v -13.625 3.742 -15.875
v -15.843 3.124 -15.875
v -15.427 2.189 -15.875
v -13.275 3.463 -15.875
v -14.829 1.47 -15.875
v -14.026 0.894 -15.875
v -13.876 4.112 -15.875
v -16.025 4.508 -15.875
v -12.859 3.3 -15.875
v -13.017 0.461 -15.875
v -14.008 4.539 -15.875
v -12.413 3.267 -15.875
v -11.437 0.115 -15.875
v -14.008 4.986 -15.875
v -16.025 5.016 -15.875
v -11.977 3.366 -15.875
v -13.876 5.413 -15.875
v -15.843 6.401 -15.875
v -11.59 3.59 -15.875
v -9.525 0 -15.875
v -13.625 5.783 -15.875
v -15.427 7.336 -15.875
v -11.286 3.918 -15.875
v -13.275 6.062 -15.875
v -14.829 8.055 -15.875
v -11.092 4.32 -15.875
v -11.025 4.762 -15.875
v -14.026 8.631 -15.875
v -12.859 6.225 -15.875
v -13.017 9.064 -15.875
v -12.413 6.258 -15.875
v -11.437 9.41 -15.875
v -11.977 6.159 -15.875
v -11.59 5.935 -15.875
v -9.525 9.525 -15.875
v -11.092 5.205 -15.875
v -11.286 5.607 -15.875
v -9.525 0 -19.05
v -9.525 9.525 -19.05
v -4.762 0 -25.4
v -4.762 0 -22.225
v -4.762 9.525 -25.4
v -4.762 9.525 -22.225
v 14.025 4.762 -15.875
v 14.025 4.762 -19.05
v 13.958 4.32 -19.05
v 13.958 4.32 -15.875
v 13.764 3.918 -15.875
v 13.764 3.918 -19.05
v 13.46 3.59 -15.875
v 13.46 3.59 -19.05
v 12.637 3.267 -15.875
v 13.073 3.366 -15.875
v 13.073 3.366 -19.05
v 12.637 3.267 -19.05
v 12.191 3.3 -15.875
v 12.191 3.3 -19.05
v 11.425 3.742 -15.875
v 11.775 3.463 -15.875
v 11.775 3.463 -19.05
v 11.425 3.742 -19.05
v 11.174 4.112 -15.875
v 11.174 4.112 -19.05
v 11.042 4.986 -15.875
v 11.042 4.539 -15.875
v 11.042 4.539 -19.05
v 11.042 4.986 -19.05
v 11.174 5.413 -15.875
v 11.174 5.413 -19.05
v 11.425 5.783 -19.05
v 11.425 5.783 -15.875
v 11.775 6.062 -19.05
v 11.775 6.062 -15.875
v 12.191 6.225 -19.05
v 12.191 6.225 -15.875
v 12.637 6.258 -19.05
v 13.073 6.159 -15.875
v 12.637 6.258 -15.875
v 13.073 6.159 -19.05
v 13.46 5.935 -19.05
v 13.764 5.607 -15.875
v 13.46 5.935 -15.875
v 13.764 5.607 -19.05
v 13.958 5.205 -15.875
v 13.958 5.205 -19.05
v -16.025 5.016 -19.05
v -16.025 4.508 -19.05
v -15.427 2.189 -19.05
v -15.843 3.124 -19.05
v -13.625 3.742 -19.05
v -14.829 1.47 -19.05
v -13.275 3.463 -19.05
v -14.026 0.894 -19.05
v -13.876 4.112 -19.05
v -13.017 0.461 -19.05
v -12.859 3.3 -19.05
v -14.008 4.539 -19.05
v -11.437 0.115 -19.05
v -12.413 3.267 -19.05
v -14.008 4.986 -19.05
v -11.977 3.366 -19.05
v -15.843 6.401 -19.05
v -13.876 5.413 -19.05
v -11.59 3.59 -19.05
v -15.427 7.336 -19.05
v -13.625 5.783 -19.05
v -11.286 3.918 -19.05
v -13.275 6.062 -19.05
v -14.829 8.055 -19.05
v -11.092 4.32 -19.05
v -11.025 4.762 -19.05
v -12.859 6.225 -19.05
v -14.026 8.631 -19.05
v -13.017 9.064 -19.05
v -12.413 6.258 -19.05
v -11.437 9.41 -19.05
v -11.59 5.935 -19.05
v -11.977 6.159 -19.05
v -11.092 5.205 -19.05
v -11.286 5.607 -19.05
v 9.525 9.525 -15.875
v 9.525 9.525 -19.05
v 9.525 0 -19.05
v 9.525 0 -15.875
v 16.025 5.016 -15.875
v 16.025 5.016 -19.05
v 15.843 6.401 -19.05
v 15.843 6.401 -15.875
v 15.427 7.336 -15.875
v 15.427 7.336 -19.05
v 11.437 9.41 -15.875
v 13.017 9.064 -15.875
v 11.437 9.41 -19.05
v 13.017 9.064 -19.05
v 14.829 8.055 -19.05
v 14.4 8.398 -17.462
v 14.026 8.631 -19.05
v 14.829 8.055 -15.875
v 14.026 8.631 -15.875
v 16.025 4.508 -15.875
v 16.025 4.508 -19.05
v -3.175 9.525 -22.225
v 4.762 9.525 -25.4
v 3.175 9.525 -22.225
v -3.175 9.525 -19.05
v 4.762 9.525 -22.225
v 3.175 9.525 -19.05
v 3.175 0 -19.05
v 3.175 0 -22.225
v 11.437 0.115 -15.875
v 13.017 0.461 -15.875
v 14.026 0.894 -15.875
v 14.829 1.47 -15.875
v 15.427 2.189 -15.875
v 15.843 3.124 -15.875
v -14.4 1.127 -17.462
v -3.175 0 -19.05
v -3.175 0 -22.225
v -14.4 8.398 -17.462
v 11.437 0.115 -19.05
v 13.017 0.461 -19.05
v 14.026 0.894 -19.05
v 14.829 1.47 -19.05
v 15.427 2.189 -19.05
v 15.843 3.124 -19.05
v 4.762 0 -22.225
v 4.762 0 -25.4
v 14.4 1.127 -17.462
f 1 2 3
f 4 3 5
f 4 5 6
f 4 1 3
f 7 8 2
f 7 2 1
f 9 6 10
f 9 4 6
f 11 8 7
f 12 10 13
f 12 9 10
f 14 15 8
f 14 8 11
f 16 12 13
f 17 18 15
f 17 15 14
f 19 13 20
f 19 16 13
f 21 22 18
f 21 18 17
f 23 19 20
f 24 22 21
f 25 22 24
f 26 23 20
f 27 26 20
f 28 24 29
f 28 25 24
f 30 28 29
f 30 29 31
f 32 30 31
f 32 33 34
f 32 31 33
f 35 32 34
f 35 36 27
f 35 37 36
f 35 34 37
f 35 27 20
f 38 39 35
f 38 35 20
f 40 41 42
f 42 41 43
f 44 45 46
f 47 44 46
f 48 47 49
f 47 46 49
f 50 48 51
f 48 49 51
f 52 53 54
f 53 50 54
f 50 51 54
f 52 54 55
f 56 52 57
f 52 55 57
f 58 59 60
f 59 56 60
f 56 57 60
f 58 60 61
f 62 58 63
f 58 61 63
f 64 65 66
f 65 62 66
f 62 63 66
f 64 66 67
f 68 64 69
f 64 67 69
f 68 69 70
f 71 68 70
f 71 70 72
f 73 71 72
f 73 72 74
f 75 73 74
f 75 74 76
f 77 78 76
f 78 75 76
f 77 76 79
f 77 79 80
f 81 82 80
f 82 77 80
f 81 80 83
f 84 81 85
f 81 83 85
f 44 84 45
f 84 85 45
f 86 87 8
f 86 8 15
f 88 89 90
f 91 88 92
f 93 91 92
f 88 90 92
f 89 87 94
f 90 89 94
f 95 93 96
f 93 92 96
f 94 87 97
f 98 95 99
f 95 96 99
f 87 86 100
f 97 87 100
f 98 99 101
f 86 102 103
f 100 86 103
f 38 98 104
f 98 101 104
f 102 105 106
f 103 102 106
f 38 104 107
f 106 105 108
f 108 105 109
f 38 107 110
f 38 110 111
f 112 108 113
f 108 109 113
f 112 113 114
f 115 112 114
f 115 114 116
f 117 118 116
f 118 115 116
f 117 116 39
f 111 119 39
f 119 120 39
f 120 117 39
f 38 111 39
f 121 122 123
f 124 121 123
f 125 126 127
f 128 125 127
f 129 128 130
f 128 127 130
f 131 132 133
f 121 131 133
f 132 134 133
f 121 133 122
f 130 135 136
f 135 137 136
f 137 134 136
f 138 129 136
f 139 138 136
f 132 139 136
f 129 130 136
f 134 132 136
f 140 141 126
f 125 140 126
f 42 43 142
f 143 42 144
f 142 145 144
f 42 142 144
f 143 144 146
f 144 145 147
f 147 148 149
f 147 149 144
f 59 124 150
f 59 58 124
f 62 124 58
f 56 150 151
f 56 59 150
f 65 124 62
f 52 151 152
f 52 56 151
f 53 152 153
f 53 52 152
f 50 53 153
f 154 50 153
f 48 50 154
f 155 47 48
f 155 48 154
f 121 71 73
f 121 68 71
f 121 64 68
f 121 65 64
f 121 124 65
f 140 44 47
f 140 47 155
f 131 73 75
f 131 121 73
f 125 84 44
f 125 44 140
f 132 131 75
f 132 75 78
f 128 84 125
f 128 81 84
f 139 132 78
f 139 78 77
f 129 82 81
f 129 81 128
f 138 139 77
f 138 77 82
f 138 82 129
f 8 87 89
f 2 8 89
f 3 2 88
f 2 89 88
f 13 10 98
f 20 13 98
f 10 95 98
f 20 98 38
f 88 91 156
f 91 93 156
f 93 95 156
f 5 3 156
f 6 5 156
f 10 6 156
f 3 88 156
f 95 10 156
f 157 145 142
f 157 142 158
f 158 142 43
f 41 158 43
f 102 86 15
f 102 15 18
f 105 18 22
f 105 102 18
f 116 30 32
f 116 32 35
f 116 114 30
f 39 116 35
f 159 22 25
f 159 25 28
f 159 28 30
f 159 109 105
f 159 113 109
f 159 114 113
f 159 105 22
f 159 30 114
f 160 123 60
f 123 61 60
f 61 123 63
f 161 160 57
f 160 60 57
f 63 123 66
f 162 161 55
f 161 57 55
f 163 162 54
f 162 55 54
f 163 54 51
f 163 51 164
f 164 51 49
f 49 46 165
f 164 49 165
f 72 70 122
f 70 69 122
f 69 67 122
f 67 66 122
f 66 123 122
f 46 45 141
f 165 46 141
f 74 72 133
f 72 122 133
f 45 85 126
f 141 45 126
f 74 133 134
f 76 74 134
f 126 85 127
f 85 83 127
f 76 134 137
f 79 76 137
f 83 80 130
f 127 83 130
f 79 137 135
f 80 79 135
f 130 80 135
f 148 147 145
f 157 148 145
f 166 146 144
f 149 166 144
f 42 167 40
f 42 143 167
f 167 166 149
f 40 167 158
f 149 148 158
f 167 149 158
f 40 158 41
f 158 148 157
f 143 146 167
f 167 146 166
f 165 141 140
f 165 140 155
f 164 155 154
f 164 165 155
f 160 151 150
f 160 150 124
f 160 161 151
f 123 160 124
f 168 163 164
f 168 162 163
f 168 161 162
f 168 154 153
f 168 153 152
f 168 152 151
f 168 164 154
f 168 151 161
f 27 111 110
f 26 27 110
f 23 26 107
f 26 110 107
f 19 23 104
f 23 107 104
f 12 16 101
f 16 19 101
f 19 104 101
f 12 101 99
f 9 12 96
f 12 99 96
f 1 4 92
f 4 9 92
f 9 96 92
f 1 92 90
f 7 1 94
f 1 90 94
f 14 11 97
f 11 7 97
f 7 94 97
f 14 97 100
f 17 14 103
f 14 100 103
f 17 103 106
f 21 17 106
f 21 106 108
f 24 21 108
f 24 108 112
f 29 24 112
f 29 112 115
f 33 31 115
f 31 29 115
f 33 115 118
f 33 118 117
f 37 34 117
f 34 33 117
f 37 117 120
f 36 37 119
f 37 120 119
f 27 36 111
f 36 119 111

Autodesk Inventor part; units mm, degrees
ref_plane "Work Plane7" through (0, 3.175, 0) normal (0, 1, 0) x (1, 0, 0)
ref_plane "Work Plane8" through (9.525, 0, -19.05) normal (0, 0, -1) x (-1, 0, 0)
sketch "Sketch4" plane through (9.525, 0, -19.05) normal (0, 0, -1) x (-1, 0, 0)
  line L0 (12.7, 0) -> (6.35, 0)
  line L1 (6.35, 0) -> (6.35, 9.525)
  line L2 (6.35, 9.525) -> (12.7, 9.525)
  line L3 (12.7, 9.525) -> (12.7, 0)
  line L4 (12.7, 0) -> (6.35, 9.525) construction
  line L5 (6.35, 0) -> (12.7, 9.525) construction
  point P0 (9.525, 0)
  point P1 (9.525, 4.7625)
extrude "Extrusion4" add sketch "Sketch4" along normal blind 3.175
sketch "Sketch5" plane through (9.525, 0, -22.225) normal (0, 0, -1) x (-1, 0, 0)
  line L0 (4.7625, 0) -> (14.2875, 0)
  line L1 (14.2875, 0) -> (14.2875, 9.525)
  line L2 (14.2875, 9.525) -> (4.7625, 9.525)
  line L3 (4.7625, 9.525) -> (4.7625, 0)
  line L4 (4.7625, 0) -> (14.2875, 9.525) construction
  line L5 (14.2875, 0) -> (4.7625, 9.525) construction
  point P0 (9.525, 0)
  point P1 (9.525, 4.7625)
extrude "Extrusion5" add sketch "Sketch5" along normal blind 3.175
ref_plane "Work Plane6" through (3.175, 9.525, 25.4) normal (0, 0, 1) x (1, 0, 0)
ref_plane "Work Plane5" through (-4.7625, 0, 3.175) normal (0, 0, 1) x (1, 0, 0)
sketch "Sketch8" plane through (9.525, 0, -19.05) normal (0, 0, 1) x (1, 0, 0)
  circle A0 centre (3, 4.7625) radius 1.5
  line L0 (6.5, 4.5085) -> (6.5, 5.0165)
  line L1 (6.5, 5.0165) -> (6.5, 9.525) construction
  line L2 (6.5, 9.525) -> (0, 9.525) construction
  spline S0 degree 2 poles (6.5, 5.0165) (6.5, 9.525) (0, 9.525) knots 1 1 1 2 2 2
  line L3 (6.5, 4.5085) -> (6.5, 0) construction
  line L4 (6.5, 0) -> (0, 0) construction
  spline S1 degree 2 poles (6.5, 4.5085) (6.5, 0) (0, 0) knots 1 1 1 2 2 2
  line L5 (-9.525, 0) -> (-9.525, 9.525)
  line L6 (-14.2875, 9.525) -> (-4.7625, 9.525)
  line L7 (0, 9.525) -> (0, 0)
  line L8 (0, 0) -> (0, 9.525)
  circle A1 centre (-22.05, 4.7625) radius 1.5
  line L9 (-25.55, 4.5085) -> (-25.55, 5.0165)
  line L10 (-25.55, 5.0165) -> (-25.55, 9.525) construction
  spline S2 degree 2 poles (-25.55, 5.0165) (-25.55, 9.525) (-19.05, 9.525) knots 1 1 1 2 2 2
  line L11 (-25.55, 9.525) -> (-19.05, 9.525) construction
  line L12 (-25.55, 4.5085) -> (-25.55, 0) construction
  spline S3 degree 2 poles (-25.55, 4.5085) (-25.55, 0) (-19.05, 0) knots 1 1 1 2 2 2
  line L13 (-25.55, 0) -> (-19.05, 0) construction
  line L14 (-19.05, 9.525) -> (-19.05, 0)
  line L15 (-19.05, 0) -> (-19.05, 9.525)
  point P0 (-9.525, 0)
  point P1 (4.5, 4.7625)
  point P2 (-23.55, 4.7625)
  dimension "d30" = 3
extrude "Extrusion8" add sketch "Sketch8" along normal blind 3.175
properties part number "Connector_B"
